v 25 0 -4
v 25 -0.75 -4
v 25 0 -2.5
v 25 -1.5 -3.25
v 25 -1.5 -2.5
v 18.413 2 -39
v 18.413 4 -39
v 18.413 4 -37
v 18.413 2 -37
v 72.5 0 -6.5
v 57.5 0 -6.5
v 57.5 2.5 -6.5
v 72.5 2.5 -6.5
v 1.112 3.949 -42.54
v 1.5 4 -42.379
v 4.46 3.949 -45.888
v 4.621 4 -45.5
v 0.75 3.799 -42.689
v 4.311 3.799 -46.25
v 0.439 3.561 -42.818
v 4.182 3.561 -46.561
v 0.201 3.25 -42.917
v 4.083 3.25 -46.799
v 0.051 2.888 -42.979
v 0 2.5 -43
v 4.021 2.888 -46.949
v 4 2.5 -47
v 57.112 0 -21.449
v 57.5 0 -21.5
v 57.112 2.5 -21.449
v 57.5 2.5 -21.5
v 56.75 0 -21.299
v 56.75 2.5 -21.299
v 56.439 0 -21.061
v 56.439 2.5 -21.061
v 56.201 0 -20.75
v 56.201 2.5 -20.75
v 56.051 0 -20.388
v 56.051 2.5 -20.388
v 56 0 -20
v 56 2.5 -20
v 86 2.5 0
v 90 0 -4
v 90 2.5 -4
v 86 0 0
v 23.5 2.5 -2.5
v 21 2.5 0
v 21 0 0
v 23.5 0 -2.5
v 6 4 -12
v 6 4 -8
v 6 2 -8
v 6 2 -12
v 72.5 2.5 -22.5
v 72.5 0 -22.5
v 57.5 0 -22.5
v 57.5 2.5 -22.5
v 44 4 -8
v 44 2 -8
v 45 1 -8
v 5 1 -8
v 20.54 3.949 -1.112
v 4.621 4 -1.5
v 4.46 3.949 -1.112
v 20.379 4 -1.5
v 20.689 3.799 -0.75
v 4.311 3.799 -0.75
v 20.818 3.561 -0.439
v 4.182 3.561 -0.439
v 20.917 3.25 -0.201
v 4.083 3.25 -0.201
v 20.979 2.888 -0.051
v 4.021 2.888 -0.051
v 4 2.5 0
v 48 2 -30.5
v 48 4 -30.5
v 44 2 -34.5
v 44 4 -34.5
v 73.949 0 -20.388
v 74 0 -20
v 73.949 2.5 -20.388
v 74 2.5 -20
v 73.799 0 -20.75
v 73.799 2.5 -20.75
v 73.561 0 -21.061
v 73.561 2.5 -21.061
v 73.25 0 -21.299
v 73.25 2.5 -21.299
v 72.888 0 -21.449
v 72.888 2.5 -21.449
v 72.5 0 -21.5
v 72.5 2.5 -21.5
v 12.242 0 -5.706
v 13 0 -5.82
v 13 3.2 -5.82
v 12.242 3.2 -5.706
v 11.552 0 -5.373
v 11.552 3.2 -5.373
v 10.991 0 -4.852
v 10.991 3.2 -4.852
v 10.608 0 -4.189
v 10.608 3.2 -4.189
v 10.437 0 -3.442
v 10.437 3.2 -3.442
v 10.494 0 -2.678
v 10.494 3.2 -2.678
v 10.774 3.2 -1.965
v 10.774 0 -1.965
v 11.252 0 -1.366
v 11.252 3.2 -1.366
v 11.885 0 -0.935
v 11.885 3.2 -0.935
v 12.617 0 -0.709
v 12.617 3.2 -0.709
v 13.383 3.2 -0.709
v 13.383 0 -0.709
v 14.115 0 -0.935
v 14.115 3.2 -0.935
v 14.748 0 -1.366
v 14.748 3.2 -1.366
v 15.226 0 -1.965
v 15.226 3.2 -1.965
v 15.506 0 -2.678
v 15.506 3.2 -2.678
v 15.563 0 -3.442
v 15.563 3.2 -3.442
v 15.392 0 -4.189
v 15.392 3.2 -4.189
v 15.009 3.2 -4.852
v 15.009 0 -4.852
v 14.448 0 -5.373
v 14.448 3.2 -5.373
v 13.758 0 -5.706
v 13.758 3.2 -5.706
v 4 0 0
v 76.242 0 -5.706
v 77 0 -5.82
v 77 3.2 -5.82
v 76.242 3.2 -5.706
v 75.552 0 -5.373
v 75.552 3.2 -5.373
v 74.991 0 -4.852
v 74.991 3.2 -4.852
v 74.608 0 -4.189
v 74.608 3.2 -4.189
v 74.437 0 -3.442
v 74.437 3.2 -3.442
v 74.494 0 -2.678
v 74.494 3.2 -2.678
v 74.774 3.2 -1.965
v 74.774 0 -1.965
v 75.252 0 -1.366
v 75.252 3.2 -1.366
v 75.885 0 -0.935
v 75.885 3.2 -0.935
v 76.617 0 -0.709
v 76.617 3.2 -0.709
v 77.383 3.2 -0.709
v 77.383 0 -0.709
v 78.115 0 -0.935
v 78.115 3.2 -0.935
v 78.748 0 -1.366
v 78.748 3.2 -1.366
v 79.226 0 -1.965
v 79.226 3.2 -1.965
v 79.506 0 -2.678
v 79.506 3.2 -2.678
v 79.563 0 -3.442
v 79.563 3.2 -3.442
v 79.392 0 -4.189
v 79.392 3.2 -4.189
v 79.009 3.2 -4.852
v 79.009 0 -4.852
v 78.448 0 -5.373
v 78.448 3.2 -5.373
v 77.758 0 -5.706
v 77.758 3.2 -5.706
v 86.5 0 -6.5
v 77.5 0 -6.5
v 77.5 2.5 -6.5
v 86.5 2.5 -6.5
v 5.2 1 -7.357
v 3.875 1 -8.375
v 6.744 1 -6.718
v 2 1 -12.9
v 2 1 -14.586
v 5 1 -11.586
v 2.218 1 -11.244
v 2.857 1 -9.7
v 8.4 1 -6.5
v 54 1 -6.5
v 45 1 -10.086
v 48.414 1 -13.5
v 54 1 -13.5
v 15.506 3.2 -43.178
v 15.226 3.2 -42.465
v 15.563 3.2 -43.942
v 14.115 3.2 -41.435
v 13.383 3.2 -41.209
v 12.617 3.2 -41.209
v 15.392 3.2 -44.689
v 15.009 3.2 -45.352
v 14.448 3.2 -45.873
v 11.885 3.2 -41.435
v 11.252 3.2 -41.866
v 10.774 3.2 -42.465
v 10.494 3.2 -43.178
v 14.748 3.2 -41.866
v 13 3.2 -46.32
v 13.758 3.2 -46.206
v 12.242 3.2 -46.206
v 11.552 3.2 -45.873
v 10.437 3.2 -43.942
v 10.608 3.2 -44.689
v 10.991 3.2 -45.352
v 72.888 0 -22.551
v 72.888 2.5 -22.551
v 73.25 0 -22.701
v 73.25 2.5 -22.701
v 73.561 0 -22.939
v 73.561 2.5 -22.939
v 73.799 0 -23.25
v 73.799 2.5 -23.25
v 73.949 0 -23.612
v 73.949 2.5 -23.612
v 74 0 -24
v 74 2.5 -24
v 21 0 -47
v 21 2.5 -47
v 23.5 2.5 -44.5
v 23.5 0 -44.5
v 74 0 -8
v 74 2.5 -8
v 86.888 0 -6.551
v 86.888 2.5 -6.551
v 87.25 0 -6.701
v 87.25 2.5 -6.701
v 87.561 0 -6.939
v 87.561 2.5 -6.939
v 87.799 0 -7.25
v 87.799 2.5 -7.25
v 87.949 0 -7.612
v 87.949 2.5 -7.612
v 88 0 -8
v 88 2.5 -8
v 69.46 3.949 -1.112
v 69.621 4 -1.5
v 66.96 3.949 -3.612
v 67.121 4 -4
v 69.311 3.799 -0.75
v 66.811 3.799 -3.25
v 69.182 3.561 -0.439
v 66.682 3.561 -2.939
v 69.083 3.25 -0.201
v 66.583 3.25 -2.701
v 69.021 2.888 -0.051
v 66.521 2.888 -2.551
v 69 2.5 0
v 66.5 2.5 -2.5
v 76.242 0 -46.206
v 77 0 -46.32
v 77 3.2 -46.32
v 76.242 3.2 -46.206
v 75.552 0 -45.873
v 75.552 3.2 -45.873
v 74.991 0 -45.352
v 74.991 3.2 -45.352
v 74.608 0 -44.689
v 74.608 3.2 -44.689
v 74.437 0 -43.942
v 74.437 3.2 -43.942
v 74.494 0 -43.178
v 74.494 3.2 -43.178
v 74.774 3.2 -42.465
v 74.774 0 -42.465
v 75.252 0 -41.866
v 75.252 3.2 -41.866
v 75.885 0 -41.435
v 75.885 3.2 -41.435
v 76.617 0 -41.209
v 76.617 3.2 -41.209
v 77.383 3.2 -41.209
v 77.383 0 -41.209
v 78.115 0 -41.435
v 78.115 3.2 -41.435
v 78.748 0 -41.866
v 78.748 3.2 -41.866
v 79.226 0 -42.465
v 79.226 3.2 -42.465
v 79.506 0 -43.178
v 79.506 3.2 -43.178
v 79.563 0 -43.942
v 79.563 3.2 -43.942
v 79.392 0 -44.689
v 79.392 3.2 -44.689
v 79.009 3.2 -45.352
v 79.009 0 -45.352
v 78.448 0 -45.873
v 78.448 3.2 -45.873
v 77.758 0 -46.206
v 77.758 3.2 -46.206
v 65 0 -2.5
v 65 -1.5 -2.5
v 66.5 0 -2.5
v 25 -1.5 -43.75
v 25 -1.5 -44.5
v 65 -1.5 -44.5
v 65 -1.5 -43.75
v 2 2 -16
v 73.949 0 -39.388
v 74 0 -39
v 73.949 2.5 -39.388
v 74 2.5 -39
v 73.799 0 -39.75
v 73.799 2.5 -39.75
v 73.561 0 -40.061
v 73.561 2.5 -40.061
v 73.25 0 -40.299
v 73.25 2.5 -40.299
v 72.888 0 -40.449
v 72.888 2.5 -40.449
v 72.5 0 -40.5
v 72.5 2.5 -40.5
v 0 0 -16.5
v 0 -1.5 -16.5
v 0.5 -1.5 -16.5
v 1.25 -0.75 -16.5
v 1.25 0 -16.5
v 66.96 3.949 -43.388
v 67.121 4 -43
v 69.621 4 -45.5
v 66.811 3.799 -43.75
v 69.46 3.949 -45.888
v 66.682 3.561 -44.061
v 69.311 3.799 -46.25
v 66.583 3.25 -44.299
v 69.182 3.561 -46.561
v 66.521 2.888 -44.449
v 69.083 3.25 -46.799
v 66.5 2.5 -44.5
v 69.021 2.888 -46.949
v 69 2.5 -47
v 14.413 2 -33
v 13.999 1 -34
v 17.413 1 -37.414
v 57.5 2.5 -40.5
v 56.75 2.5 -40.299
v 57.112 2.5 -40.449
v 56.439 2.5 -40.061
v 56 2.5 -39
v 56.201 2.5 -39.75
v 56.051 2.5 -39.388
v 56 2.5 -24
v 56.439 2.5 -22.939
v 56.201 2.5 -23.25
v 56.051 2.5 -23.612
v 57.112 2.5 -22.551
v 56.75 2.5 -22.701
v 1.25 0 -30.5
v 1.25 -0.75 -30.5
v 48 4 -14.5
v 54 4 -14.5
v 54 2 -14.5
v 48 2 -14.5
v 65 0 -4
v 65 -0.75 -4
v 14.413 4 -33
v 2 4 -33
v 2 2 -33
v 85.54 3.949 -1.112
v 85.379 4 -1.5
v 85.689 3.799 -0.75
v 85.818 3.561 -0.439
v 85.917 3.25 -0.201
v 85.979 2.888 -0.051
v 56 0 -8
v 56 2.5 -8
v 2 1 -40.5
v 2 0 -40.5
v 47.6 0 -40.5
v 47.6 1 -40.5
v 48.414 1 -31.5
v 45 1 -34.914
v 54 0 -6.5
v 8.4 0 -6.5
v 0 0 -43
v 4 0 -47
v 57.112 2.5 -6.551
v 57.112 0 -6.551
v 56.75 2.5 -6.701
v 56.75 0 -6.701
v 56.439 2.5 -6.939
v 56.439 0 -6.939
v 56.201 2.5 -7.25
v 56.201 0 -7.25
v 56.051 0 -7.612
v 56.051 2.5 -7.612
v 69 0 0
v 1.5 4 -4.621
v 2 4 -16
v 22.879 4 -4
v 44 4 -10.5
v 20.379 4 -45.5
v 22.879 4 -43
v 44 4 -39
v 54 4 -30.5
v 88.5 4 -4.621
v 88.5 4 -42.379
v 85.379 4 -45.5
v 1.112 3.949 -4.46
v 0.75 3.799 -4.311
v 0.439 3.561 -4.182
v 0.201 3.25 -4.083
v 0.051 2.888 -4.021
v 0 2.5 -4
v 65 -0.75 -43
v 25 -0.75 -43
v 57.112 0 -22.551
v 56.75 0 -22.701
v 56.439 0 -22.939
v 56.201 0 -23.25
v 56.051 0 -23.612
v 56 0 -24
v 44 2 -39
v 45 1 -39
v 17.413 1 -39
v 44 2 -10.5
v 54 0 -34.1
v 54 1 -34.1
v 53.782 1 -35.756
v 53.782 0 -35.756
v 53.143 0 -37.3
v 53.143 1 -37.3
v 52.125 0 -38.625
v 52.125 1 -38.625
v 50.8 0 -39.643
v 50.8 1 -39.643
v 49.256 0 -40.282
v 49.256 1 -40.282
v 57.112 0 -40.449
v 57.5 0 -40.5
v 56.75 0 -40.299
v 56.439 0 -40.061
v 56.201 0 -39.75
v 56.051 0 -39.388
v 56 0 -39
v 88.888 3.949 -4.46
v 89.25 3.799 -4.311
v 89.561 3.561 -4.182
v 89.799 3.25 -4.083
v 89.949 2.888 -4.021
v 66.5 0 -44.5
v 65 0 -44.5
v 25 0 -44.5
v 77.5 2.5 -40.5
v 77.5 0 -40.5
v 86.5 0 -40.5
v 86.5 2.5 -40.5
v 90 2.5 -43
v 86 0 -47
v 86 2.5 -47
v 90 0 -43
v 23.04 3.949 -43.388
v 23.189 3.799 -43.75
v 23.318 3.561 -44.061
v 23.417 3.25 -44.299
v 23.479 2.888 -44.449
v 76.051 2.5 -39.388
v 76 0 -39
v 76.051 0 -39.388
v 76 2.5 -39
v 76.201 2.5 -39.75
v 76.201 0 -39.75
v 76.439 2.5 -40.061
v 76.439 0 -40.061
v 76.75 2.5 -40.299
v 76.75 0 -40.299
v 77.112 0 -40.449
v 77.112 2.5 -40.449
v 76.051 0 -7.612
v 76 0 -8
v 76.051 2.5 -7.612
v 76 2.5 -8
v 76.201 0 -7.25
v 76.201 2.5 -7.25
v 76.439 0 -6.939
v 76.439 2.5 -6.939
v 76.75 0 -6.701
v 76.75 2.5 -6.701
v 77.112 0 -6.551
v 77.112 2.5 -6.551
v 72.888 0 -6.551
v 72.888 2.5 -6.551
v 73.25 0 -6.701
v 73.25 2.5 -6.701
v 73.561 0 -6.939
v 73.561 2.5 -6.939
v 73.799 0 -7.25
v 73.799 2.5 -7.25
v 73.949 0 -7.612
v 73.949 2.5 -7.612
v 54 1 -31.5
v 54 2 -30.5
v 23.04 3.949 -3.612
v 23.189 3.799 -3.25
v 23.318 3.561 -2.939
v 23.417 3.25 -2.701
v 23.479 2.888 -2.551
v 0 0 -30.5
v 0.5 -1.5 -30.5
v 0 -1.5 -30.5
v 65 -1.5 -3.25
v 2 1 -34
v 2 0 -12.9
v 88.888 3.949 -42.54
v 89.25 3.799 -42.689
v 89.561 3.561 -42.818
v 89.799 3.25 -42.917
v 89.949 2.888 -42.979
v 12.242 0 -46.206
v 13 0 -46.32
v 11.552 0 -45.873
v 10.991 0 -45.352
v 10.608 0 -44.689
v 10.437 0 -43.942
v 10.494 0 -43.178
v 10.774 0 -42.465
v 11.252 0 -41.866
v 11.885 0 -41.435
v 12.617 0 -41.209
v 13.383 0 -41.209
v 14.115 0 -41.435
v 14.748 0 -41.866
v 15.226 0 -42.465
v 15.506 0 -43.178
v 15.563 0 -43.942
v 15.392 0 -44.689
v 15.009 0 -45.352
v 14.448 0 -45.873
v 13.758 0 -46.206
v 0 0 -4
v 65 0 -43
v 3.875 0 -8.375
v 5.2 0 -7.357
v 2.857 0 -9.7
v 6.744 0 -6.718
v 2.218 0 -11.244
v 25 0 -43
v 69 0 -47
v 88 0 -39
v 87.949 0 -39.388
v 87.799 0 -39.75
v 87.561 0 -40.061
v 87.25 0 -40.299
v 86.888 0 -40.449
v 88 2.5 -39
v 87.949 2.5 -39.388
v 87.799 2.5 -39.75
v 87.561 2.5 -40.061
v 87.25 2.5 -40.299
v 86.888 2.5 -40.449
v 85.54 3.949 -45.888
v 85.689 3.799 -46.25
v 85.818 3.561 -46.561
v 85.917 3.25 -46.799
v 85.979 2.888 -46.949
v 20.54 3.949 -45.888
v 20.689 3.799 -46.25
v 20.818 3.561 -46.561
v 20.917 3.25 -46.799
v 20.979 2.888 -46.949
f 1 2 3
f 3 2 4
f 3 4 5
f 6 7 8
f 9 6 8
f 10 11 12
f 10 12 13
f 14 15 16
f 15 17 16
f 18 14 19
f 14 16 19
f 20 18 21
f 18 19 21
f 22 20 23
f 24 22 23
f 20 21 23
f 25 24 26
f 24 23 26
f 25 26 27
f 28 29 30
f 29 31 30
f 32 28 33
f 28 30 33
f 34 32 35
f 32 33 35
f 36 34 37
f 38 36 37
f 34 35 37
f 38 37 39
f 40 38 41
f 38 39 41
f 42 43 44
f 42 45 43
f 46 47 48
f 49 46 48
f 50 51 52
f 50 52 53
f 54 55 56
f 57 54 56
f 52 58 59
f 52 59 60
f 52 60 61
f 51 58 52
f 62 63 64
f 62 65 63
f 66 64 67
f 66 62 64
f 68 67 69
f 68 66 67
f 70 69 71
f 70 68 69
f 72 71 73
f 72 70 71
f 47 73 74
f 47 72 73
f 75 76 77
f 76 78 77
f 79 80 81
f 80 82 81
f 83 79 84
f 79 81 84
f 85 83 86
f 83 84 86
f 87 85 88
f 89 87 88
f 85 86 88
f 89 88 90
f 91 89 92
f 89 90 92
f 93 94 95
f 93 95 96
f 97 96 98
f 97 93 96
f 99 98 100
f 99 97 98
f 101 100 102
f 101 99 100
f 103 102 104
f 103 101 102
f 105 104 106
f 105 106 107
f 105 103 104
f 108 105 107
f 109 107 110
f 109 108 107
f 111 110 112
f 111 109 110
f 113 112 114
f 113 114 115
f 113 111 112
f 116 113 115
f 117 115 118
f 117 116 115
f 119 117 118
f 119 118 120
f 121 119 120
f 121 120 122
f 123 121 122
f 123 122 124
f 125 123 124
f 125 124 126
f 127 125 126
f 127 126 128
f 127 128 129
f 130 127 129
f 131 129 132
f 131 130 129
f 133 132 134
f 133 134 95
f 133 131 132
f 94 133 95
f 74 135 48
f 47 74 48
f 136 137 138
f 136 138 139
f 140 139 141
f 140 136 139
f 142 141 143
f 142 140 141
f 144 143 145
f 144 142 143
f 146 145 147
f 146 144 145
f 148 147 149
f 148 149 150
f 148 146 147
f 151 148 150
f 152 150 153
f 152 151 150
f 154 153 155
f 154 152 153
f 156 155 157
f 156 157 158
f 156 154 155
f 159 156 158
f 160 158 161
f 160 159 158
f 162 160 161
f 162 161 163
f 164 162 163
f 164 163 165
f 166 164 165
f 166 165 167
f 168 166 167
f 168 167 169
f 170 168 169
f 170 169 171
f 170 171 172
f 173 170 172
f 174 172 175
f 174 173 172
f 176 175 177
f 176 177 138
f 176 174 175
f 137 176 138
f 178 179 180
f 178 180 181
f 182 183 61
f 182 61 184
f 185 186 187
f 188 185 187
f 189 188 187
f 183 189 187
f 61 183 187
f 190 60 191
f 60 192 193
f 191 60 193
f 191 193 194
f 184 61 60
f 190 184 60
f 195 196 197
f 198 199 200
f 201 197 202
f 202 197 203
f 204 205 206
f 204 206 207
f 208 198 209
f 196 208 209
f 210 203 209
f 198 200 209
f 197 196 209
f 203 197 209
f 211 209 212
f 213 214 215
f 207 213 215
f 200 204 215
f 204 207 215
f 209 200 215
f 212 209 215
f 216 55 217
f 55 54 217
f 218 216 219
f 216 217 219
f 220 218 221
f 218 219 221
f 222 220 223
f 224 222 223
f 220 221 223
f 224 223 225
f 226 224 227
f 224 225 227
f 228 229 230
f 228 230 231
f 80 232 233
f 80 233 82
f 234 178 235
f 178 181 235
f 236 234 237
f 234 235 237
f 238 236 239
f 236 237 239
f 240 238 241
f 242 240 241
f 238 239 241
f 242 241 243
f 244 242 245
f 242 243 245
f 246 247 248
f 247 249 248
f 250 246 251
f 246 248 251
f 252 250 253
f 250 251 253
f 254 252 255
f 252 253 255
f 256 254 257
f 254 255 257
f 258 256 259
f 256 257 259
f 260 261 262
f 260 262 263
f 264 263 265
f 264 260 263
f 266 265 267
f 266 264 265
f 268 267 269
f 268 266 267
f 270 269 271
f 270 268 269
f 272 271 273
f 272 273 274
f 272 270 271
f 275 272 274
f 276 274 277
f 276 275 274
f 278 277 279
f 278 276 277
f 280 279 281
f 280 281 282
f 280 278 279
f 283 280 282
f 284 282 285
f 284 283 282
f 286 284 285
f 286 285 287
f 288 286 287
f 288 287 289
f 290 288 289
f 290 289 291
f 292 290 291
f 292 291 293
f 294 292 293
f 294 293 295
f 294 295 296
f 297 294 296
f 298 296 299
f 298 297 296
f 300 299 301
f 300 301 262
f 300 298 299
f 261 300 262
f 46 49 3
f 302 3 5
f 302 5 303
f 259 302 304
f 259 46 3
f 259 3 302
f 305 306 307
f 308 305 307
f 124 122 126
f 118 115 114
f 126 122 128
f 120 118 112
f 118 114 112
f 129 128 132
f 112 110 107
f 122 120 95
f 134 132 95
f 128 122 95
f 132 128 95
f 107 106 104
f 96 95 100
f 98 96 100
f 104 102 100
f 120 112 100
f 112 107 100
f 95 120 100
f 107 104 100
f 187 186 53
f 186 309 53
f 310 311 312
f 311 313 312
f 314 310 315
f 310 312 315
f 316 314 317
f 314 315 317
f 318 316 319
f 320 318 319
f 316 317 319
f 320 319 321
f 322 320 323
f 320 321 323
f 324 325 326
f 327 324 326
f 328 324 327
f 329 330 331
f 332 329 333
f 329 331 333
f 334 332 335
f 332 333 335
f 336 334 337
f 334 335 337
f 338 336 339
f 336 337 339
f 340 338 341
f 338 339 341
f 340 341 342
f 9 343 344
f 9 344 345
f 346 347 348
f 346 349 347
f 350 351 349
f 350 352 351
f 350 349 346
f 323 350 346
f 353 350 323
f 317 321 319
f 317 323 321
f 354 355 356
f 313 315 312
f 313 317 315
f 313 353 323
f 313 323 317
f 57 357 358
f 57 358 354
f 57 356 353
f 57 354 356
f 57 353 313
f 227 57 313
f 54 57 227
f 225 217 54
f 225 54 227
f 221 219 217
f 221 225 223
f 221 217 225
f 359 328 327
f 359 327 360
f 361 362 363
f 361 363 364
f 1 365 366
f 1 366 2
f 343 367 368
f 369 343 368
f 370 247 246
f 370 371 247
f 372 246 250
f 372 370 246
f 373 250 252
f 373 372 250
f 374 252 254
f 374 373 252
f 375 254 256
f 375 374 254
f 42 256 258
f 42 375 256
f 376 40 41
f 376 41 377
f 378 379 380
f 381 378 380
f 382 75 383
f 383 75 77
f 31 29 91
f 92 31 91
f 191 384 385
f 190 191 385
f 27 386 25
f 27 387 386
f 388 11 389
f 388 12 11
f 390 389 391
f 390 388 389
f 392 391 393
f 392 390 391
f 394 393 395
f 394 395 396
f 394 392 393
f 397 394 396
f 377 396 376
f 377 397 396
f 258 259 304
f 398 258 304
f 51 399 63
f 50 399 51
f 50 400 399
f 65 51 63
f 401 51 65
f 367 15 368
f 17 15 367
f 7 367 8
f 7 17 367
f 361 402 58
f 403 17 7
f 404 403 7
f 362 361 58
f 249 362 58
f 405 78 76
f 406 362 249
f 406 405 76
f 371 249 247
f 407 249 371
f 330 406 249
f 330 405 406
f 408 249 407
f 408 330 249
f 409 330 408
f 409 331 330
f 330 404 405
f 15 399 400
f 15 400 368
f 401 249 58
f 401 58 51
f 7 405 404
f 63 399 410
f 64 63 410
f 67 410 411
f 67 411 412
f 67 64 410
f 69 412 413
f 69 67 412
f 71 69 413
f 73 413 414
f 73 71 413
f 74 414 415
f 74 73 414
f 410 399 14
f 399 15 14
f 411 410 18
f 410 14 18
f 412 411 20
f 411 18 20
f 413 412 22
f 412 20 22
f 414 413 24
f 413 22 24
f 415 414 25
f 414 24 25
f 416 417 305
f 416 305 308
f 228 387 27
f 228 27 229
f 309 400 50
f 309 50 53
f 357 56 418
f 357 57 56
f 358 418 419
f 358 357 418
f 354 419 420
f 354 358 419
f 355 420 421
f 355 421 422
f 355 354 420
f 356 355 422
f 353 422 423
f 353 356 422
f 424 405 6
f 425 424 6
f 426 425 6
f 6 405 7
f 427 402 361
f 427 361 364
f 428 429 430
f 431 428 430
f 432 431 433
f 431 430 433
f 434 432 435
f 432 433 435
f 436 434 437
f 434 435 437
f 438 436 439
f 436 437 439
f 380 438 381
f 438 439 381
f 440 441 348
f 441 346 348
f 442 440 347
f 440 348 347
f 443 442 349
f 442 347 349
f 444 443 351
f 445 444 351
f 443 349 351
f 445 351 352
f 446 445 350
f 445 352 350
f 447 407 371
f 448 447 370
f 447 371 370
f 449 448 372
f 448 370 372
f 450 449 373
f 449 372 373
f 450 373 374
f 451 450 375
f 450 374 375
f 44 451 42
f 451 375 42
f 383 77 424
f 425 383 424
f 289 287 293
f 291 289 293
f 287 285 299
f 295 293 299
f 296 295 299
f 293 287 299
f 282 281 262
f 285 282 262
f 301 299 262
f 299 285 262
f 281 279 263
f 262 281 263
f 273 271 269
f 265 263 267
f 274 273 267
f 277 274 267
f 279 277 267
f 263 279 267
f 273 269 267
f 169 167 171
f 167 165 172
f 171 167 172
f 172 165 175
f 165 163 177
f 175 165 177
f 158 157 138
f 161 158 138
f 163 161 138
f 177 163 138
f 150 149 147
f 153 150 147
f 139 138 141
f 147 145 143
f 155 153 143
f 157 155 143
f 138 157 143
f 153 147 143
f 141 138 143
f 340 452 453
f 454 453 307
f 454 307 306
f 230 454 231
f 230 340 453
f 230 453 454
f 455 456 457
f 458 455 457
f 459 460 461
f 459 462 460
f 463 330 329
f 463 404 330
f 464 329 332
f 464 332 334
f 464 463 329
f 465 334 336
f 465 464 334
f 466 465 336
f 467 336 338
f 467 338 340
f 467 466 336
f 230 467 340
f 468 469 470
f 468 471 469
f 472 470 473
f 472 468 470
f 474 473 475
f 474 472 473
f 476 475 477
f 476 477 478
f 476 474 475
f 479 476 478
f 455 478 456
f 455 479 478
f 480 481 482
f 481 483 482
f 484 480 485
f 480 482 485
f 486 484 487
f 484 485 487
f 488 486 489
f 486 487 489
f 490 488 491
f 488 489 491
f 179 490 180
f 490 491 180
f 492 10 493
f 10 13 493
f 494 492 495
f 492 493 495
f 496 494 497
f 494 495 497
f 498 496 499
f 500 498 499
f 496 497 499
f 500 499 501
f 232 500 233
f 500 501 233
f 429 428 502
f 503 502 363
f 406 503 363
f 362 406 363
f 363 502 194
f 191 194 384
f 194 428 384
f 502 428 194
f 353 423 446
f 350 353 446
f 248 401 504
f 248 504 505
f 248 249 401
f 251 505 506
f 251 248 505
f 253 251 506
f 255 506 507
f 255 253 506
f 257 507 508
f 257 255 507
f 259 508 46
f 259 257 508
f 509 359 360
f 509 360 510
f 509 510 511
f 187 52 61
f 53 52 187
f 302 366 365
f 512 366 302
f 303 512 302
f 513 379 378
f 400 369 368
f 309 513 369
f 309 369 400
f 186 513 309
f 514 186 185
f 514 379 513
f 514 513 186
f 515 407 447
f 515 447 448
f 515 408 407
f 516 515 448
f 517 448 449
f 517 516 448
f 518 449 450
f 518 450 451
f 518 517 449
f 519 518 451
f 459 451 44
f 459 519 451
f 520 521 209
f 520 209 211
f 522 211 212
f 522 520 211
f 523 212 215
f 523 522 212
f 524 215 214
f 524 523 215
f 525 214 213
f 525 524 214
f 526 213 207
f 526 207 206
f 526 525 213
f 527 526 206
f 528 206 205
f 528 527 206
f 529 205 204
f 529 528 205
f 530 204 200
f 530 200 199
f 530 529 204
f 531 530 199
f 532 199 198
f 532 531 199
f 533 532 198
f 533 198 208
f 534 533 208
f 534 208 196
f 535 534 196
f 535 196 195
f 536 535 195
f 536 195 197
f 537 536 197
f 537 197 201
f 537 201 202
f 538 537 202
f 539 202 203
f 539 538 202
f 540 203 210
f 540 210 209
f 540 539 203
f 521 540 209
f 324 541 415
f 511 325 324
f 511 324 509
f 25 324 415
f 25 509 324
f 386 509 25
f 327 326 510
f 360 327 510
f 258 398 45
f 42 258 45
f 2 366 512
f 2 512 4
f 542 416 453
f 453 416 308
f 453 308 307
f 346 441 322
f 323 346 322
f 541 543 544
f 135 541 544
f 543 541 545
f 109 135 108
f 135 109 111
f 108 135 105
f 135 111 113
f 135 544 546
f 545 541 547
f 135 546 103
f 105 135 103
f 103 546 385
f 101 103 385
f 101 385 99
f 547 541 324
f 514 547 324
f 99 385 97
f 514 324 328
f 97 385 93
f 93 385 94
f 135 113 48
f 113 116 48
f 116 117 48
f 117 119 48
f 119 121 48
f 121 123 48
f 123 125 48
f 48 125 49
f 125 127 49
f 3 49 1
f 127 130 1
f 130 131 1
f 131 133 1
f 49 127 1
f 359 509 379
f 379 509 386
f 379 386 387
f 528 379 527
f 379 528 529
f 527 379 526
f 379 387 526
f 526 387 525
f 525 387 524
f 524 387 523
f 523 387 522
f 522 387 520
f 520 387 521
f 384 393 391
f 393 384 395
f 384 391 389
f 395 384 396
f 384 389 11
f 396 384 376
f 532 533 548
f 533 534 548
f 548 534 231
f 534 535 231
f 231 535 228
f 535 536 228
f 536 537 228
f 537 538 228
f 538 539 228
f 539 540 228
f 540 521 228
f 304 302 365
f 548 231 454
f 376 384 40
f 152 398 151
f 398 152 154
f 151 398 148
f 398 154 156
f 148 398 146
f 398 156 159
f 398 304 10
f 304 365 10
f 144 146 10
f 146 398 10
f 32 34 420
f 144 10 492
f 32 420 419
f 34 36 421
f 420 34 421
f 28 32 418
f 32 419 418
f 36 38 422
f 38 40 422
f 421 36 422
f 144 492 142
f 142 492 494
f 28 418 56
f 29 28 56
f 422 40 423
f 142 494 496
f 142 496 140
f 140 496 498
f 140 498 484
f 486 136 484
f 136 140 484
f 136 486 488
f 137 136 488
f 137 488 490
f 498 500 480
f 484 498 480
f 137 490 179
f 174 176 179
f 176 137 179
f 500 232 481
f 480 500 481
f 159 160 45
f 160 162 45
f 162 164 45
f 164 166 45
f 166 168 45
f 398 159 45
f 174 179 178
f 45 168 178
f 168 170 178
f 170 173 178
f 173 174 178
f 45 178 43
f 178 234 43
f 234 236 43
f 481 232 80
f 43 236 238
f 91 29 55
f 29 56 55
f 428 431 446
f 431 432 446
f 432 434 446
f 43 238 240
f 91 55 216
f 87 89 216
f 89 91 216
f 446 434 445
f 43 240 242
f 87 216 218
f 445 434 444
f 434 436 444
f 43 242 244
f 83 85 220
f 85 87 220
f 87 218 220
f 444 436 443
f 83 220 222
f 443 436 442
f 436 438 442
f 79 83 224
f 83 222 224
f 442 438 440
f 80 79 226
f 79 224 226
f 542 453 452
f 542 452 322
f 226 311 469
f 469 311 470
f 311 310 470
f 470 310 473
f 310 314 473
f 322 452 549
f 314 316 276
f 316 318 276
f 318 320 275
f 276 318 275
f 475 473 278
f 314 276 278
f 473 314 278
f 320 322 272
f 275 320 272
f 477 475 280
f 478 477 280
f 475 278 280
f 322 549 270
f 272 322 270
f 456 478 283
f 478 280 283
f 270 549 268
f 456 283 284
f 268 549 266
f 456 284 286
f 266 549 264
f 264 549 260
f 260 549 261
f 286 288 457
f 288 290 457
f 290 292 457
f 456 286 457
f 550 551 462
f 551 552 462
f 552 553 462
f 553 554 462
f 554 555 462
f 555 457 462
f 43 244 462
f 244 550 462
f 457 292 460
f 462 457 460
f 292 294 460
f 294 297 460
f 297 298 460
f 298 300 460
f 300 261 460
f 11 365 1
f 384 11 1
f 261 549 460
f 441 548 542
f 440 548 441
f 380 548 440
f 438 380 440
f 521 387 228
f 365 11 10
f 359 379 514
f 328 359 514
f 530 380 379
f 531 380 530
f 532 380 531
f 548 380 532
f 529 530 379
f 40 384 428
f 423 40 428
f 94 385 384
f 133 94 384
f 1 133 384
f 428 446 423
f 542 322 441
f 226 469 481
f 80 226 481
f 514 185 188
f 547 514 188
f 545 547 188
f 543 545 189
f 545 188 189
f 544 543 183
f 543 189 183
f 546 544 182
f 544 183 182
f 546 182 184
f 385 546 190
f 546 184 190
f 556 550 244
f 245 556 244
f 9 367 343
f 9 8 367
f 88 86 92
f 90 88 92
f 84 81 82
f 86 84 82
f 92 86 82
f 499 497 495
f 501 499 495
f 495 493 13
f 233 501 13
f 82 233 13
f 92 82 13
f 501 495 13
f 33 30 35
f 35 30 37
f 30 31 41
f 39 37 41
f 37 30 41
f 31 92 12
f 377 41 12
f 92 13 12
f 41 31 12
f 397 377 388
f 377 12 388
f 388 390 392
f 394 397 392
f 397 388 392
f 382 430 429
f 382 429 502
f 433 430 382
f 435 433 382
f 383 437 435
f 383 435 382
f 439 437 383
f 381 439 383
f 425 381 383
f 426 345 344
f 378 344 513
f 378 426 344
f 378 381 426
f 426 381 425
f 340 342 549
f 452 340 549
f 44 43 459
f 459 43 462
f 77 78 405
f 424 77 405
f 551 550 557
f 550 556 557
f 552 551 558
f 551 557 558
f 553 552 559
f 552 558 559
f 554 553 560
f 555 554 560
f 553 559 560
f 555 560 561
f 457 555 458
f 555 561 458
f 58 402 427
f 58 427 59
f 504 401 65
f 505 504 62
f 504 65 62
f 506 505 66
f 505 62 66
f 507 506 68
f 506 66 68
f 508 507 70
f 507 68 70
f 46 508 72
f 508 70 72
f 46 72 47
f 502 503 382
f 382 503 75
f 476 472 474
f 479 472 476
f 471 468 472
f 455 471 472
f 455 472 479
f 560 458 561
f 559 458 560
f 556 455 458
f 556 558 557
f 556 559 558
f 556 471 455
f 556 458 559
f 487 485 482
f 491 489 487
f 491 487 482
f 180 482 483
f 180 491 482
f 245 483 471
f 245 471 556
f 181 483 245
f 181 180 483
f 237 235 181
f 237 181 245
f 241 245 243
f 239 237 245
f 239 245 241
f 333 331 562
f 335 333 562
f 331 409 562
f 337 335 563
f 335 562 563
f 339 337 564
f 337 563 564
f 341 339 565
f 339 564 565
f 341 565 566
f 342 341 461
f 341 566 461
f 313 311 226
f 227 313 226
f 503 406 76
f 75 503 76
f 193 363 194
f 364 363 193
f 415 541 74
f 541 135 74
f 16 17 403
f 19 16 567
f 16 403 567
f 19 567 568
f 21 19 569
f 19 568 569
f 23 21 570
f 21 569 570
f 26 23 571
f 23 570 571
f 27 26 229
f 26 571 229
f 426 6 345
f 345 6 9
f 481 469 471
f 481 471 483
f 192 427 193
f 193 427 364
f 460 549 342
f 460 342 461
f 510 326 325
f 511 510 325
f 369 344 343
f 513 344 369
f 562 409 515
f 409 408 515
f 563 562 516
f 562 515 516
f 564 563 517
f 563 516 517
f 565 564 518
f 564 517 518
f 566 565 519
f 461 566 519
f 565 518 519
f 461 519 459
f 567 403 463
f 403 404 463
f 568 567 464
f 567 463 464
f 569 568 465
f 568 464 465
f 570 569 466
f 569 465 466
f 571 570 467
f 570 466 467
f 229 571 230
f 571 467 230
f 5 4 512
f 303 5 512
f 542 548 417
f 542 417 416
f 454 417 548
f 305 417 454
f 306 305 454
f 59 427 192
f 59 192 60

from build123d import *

# Parameters (mm, degrees)
SKETCH1_W           = 90
SKETCH1_H           = 47
BOSS_EXTRUDE1_DEPTH = 4
CUT_EXTRUDE1_START  = -4
CUT_EXTRUDE1_DEPTH  = 106.612007165
FILLET1_R           = 6.4
CUT_EXTRUDE3_START  = -4
SKETCH4_R           = 2.57
CUT_EXTRUDE3_DEPTH  = 3.2
SKETCH5_W           = 20
SKETCH5_H           = 4
CUT_EXTRUDE4_DEPTH  = 21.1
CHAMFER1_SIZE       = 4
BOSS_EXTRUDE2_DEPTH = 3
CHAMFER2_SIZE       = 4
CHAMFER3_SIZE       = 4
SKETCH7_W           = 12
SKETCH7_H           = 34
CUT_EXTRUDE5_DEPTH  = 2.5
FILLET2_R           = 1.5
CHAMFER4_SIZE       = 1
BOSS_EXTRUDE3_DEPTH = 5.5
CUT_EXTRUDE6_DEPTH  = 1.5
FILLET3_R           = 1.5
BOSS_EXTRUDE4_DEPTH = 1.5
CHAMFER6_SIZE       = 0.75


with BuildPart() as part:
    # Sketch1 → Boss-Extrude1 (new body)
    with BuildSketch(Plane(origin=(0, 0, 0), x_dir=(1, 0, 0), z_dir=(0, 1, 0))):
        with Locations((45, 23.5)):
            Rectangle(SKETCH1_W, SKETCH1_H)
    extrude(amount=BOSS_EXTRUDE1_DEPTH)

    # Sketch2 → Cut-Extrude1 (cut, through all)
    with BuildSketch(Plane(origin=(0, 4, 0), x_dir=(1, 0, 0), z_dir=(0, 1, 0)).offset(CUT_EXTRUDE1_START)):
        Polygon((2, 23.5), (2, 40.5), (54, 40.5), (54, 6.5), (2, 6.5), align=None)
    extrude(amount=CUT_EXTRUDE1_DEPTH, mode=Mode.SUBTRACT)

    # Fillet1
    fillet1_edges = [part.edges().sort_by_distance(p)[0] for p in [
        (54, 2, -40.5),
        (2, 2, -6.5),
    ]]
    fillet(fillet1_edges, radius=FILLET1_R)

    # Sketch4 → Cut-Extrude3 (cut)
    with BuildSketch(Plane(origin=(0, 4, 0), x_dir=(1, 0, 0), z_dir=(0, 1, 0)).offset(CUT_EXTRUDE3_START)):
        with Locations(Location((13, 43.75, 0), (0, 0, 90))):
            Circle(SKETCH4_R)
        with Locations(Location((13, 3.25, 0), (0, 0, 90))):
            Circle(SKETCH4_R)
        with Locations(Location((77, 3.25, 0), (0, 0, 90))):
            Circle(SKETCH4_R)
        with Locations(Location((77, 43.75, 0), (0, 0, 90))):
            Circle(SKETCH4_R)
    extrude(amount=CUT_EXTRUDE3_DEPTH, mode=Mode.SUBTRACT)

    # Sketch5 → Cut-Extrude4 (cut)
    with BuildSketch(Plane(origin=(0, 4, 0), x_dir=(1, 0, 0), z_dir=(0, 1, 0))):
        with Locations((35, 2)):
            Rectangle(SKETCH5_W, SKETCH5_H)
        with Locations((55, 2)):
            Rectangle(SKETCH5_W, SKETCH5_H)
        with Locations((35, 45)):
            Rectangle(SKETCH5_W, SKETCH5_H)
        with Locations((55, 45)):
            Rectangle(SKETCH5_W, SKETCH5_H)
    extrude(amount=-CUT_EXTRUDE4_DEPTH, mode=Mode.SUBTRACT)

    # Chamfer1
    chamfer1_edges = [part.edges().sort_by_distance(p)[0] for p in [
        (90, 2, 0),
        (90, 2, -47),
        (0, 2, -47),
        (0, 2, 0),
        (25, 2, -47),
        (65, 2, -47),
        (65, 2, 0),
        (25, 2, 0),
    ]]
    chamfer(chamfer1_edges, length=CHAMFER1_SIZE - 0.0001)  # a hair under: the kernel refuses the full size

    # Sketch6 → Boss-Extrude2 (add)
    with BuildSketch(Plane(origin=(0, 4, 0), x_dir=(1, 0, 0), z_dir=(0, 1, 0))):
        Polygon((54, 6.5), (54, 14.5), (44, 14.5), (44, 8), (6, 8), (6, 16), (2, 16), (2, 6.5), (42, 6.5), align=None)
        Polygon((47.6, 40.5), (54, 40.5), (54, 30.5), (44, 30.5), (44, 39), (18.412776199, 39), (18.412776199, 33), (2, 33), (2, 40.5), align=None)
    extrude(amount=-BOSS_EXTRUDE2_DEPTH)

    # Chamfer2
    chamfer2_edges = [part.edges().sort_by_distance(p)[0] for p in [
        (44, 2.5, -14.5),
        (44, 2.5, -30.5),
        (18.412776199, 2.5, -33),
    ]]
    chamfer(chamfer2_edges, length=CHAMFER2_SIZE)

    # Chamfer3
    chamfer3_edges = [part.edges().sort_by_distance(p)[0] for p in [
        (6, 2.5, -16),
    ]]
    chamfer(chamfer3_edges, length=CHAMFER3_SIZE - 0.0001)  # a hair under: the kernel refuses the full size

    # Sketch7 → Cut-Extrude5 (cut)
    with BuildSketch(Plane.XZ):
        Polygon((65, -22.5), (56, -22.5), (56, -40.5), (74, -40.5), (74, -22.5), align=None)
        Polygon((56, -6.5), (74, -6.5), (74, -21.5), (65, -21.5), (56, -21.5), align=None)
        with Locations((82, -23.5)):
            Rectangle(SKETCH7_W, SKETCH7_H)
    extrude(amount=-CUT_EXTRUDE5_DEPTH, mode=Mode.SUBTRACT)

    # Fillet2
    fillet2_edges = [part.edges().sort_by_distance(p)[0] for p in [
        (76, 1.25, -6.5),
        (88, 1.25, -6.5),
        (88, 1.25, -40.5),
        (76, 1.25, -40.5),
        (56, 1.25, -21.5),
        (56, 1.25, -6.5),
        (74, 1.25, -6.5),
        (74, 1.25, -21.5),
        (74, 1.25, -22.5),
        (74, 1.25, -40.5),
        (56, 1.25, -40.5),
        (56, 1.25, -22.5),
    ]]
    fillet(fillet2_edges, radius=FILLET2_R)

    # Chamfer4
    chamfer4_edges = [part.edges().sort_by_distance(p)[0] for p in [
        (6, 1, -10.00005),
        (51, 1, -14.5),
        (44, 1, -36.75),
        (8.206388099, 1, -33),
        (18.412776199, 1, -38),
        (51, 1, -30.5),
        (46, 1, -32.5),
        (16.412776199, 1, -35),
        (44, 1, -9.25),
        (46, 1, -12.5),
        (4.00005, 1, -14.00005),
    ]]
    chamfer(chamfer4_edges, length=CHAMFER4_SIZE)

    # Sketch8 → Boss-Extrude3 (add)
    with BuildSketch(Plane(origin=(0, 4, 0), x_dir=(1, 0, 0), z_dir=(0, 1, 0))):
        Polygon((65, 4), (45, 4), (45, 2.5), (66.5, 2.5), align=None)
        Polygon((45, 2.5), (45, 4), (25, 4), (23.5, 2.5), align=None)
        Polygon((66.5, 44.5), (45, 44.5), (45, 43), (65, 43), align=None)
        Polygon((45, 44.5), (23.5, 44.5), (25, 43), (45, 43), align=None)
    extrude(amount=-BOSS_EXTRUDE3_DEPTH)

    # Sketch10 → Cut-Extrude6 (cut)
    with BuildSketch(Plane(origin=(0, -1.5, 0), x_dir=(-1, 0, 0), z_dir=(0, -1, 0))):
        Polygon((-25, 4), (-25, 2.5), (-23.5, 2.5), align=None)
        Polygon((-65, 4), (-65, 2.5), (-66.5, 2.5), align=None)
        Polygon((-65, 43), (-65, 44.5), (-66.5, 44.5), align=None)
        Polygon((-25, 43), (-25, 44.5), (-23.5, 44.5), align=None)
    extrude(amount=-CUT_EXTRUDE6_DEPTH, mode=Mode.SUBTRACT)

    # Fillet3
    fillet3_edges = [part.edges().sort_by_distance(p)[0] for p in [
        (77.5, 4, 0),
        (90, 4, -23.5),
        (77.5, 4, -47),
        (12.5, 4, -47),
        (0, 4, -23.5),
        (12.5, 4, 0),
        (1.99995, 4, -1.99995),
        (1.99995, 4, -45.00005),
        (88.00005, 4, -45.00005),
        (88.00005, 4, -1.99995),
        (22.2501, 4, -1.25),
        (67.7499, 4, -45.75),
        (67.7499, 4, -1.25),
        (45, 4, -2.5),
        (22.2501, 4, -45.75),
        (45, 4, -44.5),
    ]]
    fillet(fillet3_edges, radius=FILLET3_R)

    # Sketch11 → Boss-Extrude4 (add)
    with BuildSketch(Plane.XZ):
        Polygon((0, -23.5), (0, -16.5), (1.25, -16.5), (1.25, -30.5), (0, -30.5), align=None)
    extrude(amount=BOSS_EXTRUDE4_DEPTH)

    # Chamfer6
    chamfer6_edges = [part.edges().sort_by_distance(p)[0] for p in [
        (45, -1.5, -4),
        (45, -1.5, -43),
        (1.25, -1.5, -23.5),
    ]]
    chamfer(chamfer6_edges, length=CHAMFER6_SIZE)


solid = part.part
